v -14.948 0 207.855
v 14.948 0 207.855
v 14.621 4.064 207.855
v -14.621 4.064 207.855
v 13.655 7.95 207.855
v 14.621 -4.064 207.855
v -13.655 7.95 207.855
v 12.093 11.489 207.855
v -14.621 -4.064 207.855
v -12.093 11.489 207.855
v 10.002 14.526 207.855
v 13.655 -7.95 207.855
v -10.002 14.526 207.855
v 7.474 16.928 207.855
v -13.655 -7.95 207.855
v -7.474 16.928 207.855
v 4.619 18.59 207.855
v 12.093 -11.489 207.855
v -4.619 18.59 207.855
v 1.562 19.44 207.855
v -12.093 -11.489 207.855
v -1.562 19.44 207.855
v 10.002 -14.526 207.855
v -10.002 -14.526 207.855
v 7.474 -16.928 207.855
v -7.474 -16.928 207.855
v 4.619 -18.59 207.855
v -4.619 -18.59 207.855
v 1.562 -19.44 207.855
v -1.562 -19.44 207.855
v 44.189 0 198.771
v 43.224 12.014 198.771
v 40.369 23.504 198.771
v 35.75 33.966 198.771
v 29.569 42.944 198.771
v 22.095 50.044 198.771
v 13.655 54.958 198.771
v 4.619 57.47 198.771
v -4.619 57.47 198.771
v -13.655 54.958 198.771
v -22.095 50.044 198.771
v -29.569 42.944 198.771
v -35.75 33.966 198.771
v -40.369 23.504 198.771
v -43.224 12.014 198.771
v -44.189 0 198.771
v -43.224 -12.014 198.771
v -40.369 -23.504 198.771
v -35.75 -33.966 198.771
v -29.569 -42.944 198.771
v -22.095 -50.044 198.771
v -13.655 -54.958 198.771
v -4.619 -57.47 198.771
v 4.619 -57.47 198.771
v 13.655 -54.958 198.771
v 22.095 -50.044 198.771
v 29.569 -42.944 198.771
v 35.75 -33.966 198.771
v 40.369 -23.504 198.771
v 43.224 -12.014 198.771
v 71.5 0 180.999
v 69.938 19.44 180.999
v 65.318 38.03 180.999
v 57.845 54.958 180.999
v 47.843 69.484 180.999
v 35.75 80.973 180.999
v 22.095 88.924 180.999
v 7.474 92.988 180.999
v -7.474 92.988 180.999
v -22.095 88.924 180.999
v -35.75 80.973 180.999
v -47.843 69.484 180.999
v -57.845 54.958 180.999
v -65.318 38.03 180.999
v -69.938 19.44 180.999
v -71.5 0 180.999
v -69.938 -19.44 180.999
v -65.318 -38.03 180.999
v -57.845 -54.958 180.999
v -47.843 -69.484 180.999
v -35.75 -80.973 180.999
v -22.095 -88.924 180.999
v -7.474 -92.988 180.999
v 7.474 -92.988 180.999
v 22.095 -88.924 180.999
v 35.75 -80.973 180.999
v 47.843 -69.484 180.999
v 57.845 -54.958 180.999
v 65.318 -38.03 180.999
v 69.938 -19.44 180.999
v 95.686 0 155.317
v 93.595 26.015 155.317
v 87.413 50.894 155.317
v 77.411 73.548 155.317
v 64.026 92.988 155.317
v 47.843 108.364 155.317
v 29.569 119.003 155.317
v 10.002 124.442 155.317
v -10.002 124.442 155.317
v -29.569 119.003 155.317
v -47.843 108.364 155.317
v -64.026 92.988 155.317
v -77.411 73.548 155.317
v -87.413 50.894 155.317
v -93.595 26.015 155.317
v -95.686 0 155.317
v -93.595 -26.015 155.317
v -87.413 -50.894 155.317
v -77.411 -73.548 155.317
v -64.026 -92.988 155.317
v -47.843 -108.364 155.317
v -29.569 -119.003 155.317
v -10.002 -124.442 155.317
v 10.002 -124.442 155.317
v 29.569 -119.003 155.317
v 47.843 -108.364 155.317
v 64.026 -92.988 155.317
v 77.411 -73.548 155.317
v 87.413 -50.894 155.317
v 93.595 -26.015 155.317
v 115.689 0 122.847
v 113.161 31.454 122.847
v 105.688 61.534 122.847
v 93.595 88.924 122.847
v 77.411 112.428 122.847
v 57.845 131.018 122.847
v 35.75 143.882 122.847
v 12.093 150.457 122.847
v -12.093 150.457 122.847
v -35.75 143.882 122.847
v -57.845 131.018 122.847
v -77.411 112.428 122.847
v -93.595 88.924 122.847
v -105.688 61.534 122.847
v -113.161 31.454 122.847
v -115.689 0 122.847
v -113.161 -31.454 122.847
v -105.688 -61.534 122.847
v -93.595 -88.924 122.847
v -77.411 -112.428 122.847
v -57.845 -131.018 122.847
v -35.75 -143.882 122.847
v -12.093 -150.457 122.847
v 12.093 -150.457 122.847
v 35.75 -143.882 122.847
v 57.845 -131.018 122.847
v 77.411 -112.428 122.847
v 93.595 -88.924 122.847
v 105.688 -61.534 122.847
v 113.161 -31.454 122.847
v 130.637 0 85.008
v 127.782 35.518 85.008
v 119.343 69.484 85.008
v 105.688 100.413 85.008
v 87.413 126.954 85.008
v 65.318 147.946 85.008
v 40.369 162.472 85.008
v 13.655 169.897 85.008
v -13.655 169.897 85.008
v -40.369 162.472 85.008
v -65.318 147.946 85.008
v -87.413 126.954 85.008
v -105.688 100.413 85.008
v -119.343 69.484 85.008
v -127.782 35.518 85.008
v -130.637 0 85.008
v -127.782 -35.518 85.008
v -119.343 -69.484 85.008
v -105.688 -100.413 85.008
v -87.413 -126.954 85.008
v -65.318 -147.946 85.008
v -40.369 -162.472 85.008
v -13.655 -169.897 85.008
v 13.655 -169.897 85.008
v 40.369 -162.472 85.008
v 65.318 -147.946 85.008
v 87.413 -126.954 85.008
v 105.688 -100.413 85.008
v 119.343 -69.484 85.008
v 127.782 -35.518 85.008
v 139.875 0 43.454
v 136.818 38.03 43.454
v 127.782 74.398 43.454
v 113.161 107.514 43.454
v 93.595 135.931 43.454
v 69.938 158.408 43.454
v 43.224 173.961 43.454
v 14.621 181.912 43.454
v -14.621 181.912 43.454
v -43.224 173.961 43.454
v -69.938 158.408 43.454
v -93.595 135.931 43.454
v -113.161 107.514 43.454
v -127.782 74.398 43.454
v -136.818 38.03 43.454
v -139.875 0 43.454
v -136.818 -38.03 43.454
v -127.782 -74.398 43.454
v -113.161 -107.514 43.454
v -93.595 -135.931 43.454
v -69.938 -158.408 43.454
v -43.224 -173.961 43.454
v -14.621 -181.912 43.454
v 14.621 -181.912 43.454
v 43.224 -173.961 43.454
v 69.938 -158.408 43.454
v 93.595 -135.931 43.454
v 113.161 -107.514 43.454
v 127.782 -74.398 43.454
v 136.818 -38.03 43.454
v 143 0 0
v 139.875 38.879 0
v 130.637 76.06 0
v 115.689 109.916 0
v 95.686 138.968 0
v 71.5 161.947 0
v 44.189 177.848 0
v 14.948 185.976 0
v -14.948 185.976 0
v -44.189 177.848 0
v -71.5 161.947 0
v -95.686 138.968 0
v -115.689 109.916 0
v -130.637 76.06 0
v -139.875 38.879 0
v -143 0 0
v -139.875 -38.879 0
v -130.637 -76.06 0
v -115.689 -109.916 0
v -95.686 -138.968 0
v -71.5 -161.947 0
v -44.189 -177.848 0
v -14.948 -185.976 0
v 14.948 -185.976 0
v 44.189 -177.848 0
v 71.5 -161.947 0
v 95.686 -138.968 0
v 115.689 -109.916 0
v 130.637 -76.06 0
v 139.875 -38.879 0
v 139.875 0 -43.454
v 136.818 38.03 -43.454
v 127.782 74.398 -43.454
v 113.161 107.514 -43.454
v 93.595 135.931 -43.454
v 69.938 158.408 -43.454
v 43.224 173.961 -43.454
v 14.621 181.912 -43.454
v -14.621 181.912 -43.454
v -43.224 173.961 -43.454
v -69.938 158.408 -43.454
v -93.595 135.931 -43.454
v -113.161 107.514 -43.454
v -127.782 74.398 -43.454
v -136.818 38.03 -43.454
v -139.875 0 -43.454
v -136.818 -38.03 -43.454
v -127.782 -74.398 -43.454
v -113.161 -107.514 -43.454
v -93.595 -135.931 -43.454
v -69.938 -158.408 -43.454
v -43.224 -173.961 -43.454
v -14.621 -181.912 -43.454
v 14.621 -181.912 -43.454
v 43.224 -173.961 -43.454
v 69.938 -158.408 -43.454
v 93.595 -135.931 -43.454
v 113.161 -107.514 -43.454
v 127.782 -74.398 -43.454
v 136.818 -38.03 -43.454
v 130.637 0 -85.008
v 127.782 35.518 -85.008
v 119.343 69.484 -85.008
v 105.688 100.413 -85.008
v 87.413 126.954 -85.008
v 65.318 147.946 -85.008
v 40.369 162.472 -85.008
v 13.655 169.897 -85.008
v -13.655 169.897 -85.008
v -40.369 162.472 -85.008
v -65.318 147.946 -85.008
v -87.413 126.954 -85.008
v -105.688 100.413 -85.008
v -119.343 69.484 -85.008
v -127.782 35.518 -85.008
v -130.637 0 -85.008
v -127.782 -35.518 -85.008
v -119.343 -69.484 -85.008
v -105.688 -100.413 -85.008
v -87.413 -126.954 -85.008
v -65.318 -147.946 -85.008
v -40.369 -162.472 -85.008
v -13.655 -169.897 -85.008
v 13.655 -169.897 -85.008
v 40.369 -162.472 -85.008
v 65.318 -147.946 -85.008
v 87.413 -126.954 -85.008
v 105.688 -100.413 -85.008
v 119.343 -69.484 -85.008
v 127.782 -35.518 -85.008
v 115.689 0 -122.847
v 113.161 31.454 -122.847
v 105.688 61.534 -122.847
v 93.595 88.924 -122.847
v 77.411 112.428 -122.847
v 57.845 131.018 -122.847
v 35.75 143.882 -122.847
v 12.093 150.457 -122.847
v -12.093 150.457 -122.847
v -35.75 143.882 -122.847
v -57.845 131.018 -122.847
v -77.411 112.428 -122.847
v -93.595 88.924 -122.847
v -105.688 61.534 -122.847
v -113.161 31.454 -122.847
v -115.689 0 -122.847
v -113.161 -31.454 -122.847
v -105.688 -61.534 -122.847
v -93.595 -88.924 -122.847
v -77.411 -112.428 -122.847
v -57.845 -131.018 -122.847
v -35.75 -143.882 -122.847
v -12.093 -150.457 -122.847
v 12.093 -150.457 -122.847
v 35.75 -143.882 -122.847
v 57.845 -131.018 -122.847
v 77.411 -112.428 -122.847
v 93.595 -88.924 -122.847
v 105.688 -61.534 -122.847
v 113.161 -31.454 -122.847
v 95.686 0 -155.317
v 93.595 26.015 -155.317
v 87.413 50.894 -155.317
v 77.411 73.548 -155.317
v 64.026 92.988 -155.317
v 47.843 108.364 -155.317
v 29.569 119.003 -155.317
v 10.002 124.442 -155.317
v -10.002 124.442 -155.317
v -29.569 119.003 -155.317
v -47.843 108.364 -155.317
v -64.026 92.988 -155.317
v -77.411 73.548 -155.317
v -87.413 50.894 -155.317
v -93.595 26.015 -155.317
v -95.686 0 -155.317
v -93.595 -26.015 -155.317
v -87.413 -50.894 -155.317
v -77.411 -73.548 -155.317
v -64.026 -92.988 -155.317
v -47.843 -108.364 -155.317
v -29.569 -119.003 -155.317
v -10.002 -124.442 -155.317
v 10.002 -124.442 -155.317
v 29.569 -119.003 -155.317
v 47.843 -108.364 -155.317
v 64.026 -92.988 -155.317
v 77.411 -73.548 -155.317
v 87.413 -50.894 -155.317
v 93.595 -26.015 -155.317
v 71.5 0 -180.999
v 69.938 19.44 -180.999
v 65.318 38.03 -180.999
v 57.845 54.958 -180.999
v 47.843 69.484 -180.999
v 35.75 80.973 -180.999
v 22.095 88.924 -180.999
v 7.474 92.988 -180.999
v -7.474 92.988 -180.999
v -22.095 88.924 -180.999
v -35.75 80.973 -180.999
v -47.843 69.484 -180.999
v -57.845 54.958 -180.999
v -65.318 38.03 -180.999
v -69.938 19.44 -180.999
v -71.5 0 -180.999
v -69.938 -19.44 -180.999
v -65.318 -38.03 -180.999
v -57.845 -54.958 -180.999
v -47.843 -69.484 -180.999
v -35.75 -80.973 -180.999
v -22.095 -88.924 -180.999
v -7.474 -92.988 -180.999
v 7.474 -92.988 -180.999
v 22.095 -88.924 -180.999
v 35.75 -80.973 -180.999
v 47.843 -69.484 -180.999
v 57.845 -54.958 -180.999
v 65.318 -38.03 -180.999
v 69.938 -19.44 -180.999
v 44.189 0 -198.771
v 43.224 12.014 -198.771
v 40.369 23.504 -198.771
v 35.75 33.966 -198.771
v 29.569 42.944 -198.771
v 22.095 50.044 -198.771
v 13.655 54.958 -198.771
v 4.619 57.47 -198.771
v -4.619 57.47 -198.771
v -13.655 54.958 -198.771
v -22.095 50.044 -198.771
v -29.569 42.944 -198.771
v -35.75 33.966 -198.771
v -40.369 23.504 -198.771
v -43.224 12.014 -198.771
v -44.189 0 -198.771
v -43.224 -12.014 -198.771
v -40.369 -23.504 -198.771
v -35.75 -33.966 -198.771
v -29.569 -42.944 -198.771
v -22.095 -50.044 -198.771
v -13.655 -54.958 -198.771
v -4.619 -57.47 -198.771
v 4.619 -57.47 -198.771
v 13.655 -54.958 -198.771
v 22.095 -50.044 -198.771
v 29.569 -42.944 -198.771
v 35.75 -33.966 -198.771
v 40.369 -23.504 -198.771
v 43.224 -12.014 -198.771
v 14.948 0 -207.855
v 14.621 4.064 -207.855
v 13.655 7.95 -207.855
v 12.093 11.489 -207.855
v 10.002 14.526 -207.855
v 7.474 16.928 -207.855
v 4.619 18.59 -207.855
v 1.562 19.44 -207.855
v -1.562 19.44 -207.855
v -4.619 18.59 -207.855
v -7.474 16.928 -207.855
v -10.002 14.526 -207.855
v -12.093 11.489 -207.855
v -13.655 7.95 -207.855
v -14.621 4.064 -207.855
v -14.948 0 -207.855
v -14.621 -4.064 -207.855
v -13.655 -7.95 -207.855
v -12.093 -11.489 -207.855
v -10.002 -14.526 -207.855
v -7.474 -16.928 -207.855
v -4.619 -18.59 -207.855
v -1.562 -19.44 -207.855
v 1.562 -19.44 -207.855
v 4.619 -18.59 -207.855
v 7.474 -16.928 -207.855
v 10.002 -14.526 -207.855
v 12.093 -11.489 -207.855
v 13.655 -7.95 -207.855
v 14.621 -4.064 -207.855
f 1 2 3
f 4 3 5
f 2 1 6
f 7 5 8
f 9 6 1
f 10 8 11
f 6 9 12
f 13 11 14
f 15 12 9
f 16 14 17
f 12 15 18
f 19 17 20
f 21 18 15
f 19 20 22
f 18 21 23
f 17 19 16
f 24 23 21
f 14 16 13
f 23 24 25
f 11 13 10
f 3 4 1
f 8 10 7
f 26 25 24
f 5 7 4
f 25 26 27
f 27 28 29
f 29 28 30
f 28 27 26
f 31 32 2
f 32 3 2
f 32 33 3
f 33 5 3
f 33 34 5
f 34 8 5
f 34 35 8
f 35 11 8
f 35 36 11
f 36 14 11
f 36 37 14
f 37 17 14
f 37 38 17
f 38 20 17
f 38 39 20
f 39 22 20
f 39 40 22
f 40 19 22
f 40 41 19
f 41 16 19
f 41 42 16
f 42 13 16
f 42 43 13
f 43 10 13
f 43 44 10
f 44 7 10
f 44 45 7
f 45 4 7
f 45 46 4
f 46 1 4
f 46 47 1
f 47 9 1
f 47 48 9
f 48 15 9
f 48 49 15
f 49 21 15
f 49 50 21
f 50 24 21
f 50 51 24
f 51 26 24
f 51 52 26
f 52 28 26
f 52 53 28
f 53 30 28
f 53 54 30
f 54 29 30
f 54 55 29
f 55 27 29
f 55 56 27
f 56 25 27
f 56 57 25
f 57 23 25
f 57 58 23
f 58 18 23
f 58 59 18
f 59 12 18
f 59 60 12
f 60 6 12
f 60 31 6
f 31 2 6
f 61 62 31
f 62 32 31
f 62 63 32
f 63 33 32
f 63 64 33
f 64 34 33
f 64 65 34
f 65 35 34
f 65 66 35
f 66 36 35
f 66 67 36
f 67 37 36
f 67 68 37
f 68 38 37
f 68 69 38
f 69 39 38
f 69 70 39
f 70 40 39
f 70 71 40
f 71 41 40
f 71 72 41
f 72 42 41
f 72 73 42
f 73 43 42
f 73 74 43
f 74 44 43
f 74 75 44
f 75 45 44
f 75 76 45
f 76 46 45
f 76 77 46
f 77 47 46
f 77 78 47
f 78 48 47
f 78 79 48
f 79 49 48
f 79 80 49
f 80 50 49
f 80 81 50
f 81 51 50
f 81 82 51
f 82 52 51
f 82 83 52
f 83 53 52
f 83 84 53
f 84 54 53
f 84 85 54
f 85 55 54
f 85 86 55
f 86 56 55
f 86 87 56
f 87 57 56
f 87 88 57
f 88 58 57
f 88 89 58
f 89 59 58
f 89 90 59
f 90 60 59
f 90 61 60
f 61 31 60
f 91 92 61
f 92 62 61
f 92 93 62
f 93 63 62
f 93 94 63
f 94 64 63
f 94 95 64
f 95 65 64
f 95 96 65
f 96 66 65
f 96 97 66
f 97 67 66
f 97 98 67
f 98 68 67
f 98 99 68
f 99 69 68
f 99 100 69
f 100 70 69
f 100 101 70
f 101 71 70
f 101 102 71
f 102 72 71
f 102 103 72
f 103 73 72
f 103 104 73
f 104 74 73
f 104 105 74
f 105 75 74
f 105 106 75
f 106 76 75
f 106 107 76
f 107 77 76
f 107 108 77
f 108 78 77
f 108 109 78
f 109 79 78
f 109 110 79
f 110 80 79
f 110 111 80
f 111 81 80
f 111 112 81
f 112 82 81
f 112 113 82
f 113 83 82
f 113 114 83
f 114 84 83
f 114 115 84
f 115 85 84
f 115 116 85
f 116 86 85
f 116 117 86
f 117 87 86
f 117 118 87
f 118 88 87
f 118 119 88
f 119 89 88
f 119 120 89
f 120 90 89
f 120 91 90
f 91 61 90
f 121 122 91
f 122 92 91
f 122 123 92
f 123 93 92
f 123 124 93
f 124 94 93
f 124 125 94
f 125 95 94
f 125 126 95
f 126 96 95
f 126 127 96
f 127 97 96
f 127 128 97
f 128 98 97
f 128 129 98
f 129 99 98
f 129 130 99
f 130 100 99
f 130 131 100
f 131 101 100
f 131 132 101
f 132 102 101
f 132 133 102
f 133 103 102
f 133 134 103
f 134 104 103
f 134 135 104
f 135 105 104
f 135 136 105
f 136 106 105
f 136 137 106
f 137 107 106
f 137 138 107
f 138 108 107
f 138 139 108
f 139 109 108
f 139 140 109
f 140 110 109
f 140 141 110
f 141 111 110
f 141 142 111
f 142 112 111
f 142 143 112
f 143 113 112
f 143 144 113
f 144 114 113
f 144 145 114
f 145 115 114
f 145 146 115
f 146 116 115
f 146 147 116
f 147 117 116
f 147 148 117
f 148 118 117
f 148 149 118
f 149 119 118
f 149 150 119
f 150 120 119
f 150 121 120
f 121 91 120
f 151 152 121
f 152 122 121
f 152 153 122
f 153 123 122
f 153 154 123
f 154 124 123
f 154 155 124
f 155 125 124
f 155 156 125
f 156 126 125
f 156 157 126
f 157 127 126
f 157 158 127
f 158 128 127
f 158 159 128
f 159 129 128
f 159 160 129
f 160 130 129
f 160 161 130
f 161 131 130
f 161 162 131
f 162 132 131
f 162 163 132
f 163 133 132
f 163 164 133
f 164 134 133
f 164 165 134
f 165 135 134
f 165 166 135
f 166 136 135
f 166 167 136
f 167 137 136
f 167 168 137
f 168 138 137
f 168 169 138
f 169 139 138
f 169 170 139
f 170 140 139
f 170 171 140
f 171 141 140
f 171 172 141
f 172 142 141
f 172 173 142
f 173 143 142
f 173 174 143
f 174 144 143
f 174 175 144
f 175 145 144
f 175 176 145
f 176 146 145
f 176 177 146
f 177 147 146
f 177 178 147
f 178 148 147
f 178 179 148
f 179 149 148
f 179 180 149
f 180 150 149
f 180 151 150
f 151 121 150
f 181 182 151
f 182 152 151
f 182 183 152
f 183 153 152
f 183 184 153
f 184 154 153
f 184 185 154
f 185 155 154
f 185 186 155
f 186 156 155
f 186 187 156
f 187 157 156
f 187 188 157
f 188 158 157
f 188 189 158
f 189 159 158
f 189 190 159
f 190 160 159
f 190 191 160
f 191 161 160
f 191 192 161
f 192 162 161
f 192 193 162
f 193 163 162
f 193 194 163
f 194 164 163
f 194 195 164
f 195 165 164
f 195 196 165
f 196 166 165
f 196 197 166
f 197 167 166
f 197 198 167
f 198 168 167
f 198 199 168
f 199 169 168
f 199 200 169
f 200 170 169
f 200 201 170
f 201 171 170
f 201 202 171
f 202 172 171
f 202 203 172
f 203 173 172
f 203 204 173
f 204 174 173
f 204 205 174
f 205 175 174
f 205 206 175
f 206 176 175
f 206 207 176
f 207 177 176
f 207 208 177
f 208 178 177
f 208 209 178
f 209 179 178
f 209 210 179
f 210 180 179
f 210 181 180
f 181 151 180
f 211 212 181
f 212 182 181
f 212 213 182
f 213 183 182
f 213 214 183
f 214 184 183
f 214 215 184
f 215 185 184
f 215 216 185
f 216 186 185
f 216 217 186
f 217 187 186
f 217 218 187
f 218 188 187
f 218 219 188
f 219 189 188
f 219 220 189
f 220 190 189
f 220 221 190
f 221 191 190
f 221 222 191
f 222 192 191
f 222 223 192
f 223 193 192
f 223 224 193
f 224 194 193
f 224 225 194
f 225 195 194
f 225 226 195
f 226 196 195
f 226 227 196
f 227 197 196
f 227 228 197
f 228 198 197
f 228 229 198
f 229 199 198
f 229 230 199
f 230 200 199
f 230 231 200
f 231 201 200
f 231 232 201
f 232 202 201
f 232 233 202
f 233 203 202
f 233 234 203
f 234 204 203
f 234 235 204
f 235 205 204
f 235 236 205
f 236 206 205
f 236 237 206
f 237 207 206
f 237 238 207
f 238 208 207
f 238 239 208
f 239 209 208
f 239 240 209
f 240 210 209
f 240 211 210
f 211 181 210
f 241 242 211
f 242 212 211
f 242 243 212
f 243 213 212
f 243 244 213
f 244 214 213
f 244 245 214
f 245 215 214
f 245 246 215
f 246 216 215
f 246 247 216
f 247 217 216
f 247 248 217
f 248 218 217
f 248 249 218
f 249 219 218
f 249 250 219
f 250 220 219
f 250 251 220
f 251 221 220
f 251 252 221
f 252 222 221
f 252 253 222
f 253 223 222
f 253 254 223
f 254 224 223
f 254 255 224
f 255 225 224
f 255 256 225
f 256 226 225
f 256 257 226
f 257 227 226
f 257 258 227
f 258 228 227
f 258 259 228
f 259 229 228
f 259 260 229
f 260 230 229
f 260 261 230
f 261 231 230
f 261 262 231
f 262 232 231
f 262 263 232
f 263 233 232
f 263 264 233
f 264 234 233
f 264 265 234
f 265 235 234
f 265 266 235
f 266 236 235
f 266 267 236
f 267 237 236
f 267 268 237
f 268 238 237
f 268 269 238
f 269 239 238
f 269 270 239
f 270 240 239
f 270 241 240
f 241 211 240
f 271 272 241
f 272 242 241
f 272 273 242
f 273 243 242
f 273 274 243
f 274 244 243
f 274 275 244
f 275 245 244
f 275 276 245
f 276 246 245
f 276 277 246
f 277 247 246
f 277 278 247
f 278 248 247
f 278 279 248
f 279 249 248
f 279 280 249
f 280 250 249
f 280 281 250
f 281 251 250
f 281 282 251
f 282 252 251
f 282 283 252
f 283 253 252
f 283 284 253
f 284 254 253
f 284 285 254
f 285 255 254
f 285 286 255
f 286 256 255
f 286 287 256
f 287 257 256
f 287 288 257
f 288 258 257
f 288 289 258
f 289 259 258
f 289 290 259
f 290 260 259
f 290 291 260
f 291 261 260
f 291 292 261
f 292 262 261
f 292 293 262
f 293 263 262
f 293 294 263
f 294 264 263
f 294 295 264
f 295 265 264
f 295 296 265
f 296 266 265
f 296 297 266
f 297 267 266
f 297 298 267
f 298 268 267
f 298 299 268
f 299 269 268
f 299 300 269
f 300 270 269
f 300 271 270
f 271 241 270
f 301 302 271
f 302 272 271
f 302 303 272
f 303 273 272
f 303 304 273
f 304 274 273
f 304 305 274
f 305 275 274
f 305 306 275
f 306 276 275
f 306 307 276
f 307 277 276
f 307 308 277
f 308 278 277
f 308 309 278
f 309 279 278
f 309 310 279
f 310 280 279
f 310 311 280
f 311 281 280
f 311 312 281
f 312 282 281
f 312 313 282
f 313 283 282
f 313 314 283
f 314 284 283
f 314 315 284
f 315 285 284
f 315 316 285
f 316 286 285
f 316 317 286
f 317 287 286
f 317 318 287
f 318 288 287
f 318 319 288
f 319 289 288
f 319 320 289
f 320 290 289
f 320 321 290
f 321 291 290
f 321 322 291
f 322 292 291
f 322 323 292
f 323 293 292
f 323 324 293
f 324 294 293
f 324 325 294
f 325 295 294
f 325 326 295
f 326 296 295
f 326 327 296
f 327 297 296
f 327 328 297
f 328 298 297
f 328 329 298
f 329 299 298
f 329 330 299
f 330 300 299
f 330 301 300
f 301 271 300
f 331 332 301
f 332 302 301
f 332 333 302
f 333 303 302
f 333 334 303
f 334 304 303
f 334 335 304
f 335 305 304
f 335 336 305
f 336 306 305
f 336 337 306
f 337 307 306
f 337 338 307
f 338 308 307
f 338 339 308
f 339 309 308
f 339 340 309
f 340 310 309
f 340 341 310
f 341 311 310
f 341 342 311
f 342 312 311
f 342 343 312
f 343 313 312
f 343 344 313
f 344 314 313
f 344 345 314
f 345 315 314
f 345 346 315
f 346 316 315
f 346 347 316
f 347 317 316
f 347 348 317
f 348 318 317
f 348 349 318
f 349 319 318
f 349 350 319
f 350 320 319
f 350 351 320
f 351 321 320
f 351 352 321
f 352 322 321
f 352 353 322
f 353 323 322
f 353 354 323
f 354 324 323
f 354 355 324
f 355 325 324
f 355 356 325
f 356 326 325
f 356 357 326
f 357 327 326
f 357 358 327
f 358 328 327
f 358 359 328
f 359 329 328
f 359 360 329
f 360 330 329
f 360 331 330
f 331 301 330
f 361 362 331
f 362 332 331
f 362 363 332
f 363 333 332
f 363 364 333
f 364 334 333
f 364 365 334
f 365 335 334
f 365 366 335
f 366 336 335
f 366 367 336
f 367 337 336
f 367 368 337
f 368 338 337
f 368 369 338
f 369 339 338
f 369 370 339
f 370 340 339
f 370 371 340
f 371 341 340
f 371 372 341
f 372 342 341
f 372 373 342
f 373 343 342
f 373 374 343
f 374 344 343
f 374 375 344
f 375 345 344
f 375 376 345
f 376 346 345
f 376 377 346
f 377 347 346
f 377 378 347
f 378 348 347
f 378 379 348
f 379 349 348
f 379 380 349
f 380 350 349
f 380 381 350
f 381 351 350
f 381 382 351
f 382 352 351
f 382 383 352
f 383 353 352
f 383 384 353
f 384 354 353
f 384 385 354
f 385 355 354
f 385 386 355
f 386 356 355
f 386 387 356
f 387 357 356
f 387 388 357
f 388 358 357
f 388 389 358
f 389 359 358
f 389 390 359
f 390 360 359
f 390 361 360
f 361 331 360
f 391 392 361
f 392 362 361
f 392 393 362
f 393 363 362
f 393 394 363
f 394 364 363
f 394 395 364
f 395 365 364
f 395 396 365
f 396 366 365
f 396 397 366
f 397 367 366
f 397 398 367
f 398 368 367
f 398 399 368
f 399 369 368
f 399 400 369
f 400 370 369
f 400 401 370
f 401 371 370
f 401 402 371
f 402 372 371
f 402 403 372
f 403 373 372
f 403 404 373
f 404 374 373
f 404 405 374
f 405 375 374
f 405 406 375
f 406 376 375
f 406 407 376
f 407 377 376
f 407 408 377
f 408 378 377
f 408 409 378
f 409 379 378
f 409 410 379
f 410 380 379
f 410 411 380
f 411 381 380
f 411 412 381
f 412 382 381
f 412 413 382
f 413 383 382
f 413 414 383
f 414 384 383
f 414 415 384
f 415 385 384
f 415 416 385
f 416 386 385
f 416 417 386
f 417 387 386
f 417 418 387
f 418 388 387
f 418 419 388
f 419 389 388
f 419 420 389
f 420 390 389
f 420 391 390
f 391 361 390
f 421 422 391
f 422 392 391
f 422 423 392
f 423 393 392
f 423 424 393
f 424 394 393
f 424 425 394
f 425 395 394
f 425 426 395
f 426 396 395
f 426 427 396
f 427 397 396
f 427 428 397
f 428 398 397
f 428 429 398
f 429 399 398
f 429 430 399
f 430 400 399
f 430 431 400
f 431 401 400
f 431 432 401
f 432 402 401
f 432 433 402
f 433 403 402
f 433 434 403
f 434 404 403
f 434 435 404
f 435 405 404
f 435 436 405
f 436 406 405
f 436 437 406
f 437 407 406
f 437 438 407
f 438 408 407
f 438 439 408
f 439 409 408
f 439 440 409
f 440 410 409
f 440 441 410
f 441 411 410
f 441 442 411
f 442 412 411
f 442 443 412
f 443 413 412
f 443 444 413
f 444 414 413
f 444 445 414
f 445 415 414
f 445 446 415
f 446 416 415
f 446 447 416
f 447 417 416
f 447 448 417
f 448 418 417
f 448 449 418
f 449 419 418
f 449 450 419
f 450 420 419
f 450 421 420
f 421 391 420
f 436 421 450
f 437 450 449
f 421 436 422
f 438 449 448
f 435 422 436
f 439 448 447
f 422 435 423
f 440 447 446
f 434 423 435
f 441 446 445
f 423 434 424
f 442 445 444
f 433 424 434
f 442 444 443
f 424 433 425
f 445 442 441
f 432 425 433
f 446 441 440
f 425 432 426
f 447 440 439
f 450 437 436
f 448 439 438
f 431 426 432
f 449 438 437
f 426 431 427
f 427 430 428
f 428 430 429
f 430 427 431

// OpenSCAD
// Generated by SolidPython 1.0.1 on 2020-07-29 00:46:51


scale(v = [13, 17, 19]) {
	sphere(r = 11);
}
/***********************************************
*********      SolidPython code:      **********
************************************************
 
# import packages: SolidPython
from solid import *
from solid.utils import *
from itertools import chain, combinations, permutations


class Resize:

    def __init__(self, scad_file):
        self.scad_file = scad_file
        #self.scad_file = import_scad(scad_file)
        # cone/cylinder param:
        self.r1 = 0
        self.r2 = 0
        self.h = 0
        # rectangular prism param:
        self.w = 0
        self.l = 0
        # ellipse param:
        self.r = 0

    # import OpenScad code (file name corresponds to shape)


    # classify shape + parameters
    def assign(self, param1, param2, param3):
        if self.scad_file == 'cone.scad':
            self.r1 = param1
            self.r2 = param2
            self.h = param3
        elif self.scad_file == 'cylinder.scad':
            self.r1 = param1
            self.r2 = param2
            self.h = param3
        elif self.scad_file == 'rectangularPrism.scad':
            self.h = param1
            self.l = param2
            self.w = param3
        else:
            self.r = param1
            self.h = param2

    # resize parameters
    def iterate(self):
        x = range(3, 20, 2)
        i = 1
        if self.scad_file == 'cone.scad':
            tempList = list(permutations(x, 2))
            for temp in tempList:
                param1 = temp[0]
                param2 = temp[1]
                filepath = 'produced_scad_files/' + 'cone' + str(param1) + '_' + str(param2) + '_' + '.scad'
                scad_render_to_file(cylinder(h=param1, r1=param2, r2=0), filepath)

        elif self.scad_file == 'cylinder.scad':
            tempList = list(permutations(x, 3))
            for temp in tempList:
                param1 = temp[0]
                param2 = temp[1]
                filepath = 'produced_scad_files/' + 'cylinder' + str(param1) + '_' + str(param2) + '_' + '.scad'
                scad_render_to_file(cylinder(h=param1, r1=param2, r2=param2), filepath)

        elif self.scad_file == 'rectangularPrism.scad':
            tempList = list(permutations(x, 3))
            for temp in tempList:
                param1 = temp[0]
                param2 = temp[1]
                param3 = temp[2]
                filepath = 'produced_scad_files/' + 'rectangularPrism' + str(param1) + '_' + str(param2) + '_' + str(
                    param3) + '.scad'
                scad_render_to_file(cube(size=(param1, param2, param3)), filepath)

        elif self.scad_file == 'ellipse.scad':
            tempList = list(permutations(x, 4))
            for temp in tempList:
                param1 = temp[0]
                param2 = temp[1]
                param3 = temp[2]
                param4 = temp[3]
                filepath = 'produced_scad_files/' + 'ellipse' + str(param1) + '_' + str(param2) + '_' + str(param3) + '_' + str(param4) + '.scad'
                scad_render_to_file(scale([param1, param2, param3])(sphere(r=param4)), filepath)

    def render_to_scadfile(self):
        scad_render_to_file(scad, 'example.scad') 
 
************************************************/
